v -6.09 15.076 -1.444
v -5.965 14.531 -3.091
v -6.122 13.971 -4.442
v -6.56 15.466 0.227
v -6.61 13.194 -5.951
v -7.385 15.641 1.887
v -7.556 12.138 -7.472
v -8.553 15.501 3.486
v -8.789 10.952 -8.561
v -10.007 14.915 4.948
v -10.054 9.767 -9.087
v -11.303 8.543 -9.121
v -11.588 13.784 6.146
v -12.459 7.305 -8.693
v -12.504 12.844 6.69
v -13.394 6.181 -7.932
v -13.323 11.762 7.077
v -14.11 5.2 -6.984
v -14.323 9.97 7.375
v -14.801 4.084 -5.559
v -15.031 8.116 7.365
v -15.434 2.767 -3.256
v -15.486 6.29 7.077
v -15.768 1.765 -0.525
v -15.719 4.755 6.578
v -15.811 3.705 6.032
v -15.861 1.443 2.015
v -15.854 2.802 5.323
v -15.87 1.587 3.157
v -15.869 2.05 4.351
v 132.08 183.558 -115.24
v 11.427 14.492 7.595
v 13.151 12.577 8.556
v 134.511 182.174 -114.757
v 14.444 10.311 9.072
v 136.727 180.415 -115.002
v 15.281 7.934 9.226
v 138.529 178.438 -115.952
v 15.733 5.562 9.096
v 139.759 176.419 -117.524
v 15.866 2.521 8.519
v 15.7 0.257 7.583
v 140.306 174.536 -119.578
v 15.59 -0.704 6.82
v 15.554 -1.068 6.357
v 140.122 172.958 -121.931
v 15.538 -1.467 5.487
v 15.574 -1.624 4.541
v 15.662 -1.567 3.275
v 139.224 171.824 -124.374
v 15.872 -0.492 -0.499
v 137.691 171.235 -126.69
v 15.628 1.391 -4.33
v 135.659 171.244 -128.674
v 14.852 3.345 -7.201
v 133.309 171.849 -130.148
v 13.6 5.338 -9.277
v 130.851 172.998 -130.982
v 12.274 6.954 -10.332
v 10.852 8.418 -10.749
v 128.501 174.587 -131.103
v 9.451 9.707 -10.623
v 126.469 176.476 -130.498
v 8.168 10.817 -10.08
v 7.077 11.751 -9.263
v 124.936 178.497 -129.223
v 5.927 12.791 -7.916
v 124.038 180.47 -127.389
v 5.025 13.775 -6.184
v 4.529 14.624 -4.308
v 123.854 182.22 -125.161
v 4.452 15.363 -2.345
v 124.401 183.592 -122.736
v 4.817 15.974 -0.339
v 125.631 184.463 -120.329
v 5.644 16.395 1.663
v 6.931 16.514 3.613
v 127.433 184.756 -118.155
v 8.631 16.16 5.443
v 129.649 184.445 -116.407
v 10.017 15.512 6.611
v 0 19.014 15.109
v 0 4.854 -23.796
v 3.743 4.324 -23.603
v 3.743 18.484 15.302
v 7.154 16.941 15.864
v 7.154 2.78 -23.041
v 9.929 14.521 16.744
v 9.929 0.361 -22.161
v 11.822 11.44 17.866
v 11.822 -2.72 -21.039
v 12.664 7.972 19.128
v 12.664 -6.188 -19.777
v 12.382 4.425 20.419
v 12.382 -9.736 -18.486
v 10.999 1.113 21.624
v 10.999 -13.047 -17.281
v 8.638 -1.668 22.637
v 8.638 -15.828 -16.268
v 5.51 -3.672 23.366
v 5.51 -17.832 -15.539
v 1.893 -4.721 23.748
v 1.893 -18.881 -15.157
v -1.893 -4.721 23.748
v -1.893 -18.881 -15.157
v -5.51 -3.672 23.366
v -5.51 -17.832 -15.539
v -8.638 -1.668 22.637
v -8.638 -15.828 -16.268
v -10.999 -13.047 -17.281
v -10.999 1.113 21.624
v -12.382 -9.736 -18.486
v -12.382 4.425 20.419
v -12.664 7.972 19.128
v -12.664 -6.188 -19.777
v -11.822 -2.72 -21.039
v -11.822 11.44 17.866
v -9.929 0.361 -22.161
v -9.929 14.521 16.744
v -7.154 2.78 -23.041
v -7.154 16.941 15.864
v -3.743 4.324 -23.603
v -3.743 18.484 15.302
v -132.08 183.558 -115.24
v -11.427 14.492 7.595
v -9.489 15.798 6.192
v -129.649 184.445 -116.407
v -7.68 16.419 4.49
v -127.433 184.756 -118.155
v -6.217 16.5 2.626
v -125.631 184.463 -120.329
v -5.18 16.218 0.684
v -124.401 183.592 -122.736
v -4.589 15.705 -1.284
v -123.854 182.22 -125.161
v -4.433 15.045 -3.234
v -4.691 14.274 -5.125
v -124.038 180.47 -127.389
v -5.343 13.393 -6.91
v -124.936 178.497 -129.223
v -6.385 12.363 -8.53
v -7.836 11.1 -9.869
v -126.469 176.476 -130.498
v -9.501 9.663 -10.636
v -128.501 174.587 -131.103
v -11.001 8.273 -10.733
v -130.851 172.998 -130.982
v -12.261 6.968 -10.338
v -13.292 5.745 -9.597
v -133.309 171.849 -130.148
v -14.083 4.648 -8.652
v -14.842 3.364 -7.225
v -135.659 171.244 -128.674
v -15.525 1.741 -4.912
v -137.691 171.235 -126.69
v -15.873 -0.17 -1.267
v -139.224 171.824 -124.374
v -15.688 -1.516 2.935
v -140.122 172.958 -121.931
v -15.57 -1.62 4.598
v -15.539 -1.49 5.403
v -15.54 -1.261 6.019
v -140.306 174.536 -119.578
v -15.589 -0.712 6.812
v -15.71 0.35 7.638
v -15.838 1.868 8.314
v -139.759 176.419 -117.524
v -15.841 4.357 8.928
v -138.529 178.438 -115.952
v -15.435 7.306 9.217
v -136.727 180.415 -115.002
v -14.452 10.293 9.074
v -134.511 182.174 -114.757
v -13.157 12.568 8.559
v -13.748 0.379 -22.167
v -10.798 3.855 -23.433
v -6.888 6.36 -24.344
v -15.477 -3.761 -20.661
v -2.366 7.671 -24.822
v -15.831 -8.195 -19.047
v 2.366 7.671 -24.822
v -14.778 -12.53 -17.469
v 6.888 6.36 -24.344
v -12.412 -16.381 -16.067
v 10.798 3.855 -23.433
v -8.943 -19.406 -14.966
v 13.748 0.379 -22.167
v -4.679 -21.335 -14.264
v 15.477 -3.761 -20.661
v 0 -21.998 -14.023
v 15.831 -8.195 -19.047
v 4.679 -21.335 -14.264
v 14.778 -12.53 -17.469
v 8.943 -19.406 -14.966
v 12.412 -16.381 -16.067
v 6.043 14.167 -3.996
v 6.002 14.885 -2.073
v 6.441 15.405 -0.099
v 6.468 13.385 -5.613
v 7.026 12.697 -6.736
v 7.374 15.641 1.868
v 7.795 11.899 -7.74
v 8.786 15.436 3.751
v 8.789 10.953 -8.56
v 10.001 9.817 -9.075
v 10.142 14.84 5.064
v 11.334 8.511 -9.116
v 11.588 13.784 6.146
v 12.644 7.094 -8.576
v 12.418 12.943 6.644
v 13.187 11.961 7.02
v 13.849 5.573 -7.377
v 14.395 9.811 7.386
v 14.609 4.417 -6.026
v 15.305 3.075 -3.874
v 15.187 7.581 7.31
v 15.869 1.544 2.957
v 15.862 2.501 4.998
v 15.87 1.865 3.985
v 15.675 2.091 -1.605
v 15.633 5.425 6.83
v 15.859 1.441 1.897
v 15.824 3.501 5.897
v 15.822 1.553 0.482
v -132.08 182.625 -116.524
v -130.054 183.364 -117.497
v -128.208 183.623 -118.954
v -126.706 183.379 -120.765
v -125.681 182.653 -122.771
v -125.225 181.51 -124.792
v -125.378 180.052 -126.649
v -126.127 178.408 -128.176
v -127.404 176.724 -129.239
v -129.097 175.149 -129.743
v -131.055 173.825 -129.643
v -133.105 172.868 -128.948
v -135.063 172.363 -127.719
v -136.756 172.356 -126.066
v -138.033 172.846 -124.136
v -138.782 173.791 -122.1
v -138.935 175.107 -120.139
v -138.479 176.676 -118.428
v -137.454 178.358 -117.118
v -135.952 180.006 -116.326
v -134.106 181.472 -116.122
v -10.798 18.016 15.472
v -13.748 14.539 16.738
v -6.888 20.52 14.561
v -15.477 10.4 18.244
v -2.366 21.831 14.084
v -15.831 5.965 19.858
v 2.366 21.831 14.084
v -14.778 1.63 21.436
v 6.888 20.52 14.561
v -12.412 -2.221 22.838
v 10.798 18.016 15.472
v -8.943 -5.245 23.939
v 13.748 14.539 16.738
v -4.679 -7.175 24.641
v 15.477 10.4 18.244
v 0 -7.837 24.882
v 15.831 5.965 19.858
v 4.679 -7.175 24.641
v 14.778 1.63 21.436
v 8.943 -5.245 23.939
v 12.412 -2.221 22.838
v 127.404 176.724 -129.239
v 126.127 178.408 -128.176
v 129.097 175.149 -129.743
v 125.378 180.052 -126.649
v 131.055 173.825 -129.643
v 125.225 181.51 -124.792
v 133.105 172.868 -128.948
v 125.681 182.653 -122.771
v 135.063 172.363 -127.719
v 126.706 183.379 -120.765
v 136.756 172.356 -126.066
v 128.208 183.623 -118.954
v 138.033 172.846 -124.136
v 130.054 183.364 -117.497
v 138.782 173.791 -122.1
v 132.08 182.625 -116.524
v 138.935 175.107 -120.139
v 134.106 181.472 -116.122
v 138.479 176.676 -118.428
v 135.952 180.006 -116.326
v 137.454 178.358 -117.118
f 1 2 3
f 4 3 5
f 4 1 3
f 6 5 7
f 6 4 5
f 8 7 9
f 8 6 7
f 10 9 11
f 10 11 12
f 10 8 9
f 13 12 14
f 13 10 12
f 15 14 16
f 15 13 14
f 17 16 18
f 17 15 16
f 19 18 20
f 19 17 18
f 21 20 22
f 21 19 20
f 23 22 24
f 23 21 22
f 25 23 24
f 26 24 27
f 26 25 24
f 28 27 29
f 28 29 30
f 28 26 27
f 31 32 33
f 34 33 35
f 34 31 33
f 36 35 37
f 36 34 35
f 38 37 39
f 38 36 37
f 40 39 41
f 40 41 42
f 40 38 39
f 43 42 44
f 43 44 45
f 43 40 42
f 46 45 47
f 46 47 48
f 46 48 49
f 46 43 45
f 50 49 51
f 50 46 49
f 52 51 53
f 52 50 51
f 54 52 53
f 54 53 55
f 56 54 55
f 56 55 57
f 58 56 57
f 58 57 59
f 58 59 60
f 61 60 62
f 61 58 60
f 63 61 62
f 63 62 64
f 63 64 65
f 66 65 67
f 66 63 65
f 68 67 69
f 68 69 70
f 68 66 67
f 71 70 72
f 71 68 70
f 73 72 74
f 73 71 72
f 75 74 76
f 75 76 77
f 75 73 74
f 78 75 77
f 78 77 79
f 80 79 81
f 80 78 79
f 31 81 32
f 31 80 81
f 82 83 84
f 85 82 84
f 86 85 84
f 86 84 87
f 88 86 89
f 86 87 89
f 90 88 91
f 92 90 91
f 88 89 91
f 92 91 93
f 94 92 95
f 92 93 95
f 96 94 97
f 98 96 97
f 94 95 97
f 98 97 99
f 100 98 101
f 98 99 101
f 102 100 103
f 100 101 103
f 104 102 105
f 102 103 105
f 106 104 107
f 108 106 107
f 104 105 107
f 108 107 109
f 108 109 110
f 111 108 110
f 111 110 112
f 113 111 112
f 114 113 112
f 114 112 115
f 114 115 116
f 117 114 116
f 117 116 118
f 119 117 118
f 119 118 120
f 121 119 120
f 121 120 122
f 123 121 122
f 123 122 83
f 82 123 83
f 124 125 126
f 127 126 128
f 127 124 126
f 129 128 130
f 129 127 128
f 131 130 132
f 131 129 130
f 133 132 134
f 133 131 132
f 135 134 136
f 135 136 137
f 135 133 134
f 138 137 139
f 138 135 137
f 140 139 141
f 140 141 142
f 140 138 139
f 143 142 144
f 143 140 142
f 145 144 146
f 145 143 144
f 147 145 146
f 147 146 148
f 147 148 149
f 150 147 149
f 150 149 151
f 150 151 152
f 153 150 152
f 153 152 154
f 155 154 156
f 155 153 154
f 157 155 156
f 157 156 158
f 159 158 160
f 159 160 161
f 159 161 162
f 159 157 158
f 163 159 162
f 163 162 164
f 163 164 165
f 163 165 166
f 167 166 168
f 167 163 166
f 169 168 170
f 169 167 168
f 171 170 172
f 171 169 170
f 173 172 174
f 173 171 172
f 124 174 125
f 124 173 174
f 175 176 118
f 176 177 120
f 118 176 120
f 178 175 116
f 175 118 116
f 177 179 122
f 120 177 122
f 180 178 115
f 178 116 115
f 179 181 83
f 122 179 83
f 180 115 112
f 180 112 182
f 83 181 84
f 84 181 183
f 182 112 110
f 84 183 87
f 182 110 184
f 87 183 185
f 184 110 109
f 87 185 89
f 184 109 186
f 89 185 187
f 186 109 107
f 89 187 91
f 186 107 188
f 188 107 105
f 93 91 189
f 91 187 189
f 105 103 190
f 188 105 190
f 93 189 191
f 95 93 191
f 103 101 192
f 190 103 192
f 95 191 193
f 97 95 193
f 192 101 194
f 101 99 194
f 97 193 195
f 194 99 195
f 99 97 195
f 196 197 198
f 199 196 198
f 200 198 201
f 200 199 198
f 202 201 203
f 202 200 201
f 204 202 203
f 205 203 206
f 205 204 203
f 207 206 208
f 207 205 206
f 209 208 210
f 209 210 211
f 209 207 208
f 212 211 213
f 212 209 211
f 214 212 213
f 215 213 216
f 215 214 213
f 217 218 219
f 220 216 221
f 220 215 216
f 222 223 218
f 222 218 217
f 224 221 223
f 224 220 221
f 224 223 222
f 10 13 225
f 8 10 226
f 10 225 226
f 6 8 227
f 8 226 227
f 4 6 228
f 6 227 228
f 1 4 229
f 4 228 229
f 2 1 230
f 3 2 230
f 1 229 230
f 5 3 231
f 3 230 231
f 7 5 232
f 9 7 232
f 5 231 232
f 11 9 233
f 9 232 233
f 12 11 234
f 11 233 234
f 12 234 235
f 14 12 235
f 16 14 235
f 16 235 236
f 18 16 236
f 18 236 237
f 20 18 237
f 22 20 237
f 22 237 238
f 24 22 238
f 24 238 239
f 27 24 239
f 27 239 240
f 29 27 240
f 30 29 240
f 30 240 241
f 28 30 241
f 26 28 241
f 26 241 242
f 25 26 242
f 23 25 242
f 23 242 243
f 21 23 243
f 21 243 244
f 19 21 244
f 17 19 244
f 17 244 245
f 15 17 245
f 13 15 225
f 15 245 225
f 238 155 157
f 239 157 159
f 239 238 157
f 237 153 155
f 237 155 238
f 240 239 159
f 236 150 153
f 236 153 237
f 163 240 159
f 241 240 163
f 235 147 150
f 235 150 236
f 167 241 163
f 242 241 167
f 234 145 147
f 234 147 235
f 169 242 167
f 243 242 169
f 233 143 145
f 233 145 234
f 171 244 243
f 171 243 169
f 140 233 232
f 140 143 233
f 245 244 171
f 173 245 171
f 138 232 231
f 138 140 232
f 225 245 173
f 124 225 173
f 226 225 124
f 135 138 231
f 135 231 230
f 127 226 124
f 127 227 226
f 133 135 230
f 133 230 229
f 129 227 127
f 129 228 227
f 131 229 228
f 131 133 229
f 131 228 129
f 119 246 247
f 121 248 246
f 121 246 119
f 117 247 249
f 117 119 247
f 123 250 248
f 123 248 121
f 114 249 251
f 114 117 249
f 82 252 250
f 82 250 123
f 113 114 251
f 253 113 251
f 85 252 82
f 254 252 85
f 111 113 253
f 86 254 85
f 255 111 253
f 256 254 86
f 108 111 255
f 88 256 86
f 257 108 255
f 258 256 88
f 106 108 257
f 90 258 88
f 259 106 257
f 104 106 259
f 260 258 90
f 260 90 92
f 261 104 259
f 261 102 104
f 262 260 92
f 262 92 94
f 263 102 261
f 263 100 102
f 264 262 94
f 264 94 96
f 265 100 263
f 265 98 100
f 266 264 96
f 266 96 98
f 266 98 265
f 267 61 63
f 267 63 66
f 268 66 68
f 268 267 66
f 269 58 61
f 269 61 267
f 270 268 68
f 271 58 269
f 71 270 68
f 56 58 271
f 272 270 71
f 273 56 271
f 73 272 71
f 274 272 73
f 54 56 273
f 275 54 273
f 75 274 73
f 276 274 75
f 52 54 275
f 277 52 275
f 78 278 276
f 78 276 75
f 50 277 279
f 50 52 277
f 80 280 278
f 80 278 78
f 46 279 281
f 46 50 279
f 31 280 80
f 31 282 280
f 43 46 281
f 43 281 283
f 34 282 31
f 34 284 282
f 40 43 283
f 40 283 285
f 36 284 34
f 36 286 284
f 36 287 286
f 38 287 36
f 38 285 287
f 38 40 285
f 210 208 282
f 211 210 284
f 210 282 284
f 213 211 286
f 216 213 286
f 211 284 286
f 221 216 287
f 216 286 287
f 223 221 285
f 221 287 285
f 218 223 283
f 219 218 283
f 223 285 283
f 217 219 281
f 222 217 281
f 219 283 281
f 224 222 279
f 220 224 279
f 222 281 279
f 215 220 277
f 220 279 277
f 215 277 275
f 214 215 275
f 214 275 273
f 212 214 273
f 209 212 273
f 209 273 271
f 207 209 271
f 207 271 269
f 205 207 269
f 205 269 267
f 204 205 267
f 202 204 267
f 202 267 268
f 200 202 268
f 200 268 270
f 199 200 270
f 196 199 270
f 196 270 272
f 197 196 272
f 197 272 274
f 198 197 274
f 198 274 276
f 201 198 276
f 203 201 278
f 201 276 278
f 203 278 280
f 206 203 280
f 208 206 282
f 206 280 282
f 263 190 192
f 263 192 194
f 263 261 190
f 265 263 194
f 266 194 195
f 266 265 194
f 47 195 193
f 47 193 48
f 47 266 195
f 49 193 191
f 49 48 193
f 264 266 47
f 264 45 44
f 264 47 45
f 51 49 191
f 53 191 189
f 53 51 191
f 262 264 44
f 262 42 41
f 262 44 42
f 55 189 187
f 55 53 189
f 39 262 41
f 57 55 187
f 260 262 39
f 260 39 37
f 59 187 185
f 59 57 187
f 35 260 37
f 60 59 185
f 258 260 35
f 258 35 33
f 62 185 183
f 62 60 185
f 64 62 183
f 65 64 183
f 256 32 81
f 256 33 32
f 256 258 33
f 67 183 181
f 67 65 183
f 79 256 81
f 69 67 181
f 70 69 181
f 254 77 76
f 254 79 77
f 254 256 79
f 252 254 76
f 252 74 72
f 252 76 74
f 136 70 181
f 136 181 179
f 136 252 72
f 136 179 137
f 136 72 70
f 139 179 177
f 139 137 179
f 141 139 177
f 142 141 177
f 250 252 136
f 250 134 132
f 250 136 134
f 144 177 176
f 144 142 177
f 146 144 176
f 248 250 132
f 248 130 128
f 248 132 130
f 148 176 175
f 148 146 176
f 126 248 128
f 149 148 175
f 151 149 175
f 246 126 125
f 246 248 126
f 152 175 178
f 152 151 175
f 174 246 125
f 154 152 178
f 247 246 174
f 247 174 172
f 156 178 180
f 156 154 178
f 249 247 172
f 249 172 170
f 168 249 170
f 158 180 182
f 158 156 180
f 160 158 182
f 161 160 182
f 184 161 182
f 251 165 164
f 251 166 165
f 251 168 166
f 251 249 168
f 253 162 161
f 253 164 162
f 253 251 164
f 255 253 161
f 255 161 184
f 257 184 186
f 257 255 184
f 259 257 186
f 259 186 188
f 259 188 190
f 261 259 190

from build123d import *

# Parameters (mm, degrees)
SKETCH1_R               = 15.875
BOSS_EXTRUDE1_DEPTH     = 20.701
SWEEP1_PROFILE_R        = 9.525
SWEEP2_PROFILE_R        = 9.525
CUT_EXTRUDE2_REACH      = 369.057
SKETCH36_R              = 7.9375
CUT_EXTRUDE3_REACH      = 369.057
CUT_EXTRUDE3_END_RADIUS = 15.875
SKETCH37_R              = 7.9375
SKETCH77_R              = 15.875
BOSS_EXTRUDE2_DEPTH     = 41.402
CUT_EXTRUDE1_REACH      = 264.618
SKETCH2_R               = 12.7


with BuildPart() as part:
    # Sketch1 → Boss-Extrude1 (new, symmetric)
    with BuildSketch(Plane(origin=(0, 0, 0), x_dir=(1, 0, 0), z_dir=(0, 0.34202014332566943, 0.9396926207859081))):
        with Locations(Location((0, 0, 0), (0, 0, 270))):
            Circle(SKETCH1_R)
    extrude(amount=BOSS_EXTRUDE1_DEPTH, both=True)

    # Sweep1: sweep along a path in Sketch4
    with BuildLine(Plane(origin=(0, 3.019604439, 4.156128957), x_dir=(1, 0, 0), z_dir=(0, 0.5877852522924744, 0.8090169943749467))) as sweep1_path:
        Line((-5.08, -3.732436352), (-132.08, 216.238016209))
    # Sweep1 profile (on start of the path) → Sweep1 (sweep)
    with BuildSketch(Plane(origin=(-5.08, 0, 6.35), x_dir=(0, 0.5877852522924744, 0.8090169943749466), z_dir=(-0.5000000000000013, 0.7006292692220355, -0.5090369604551278))):
        Circle(SWEEP1_PROFILE_R)
    sweep(path=sweep1_path.line)

    # Sweep2: sweep along a path in Sketch15
    with BuildLine(Plane(origin=(0, 3.019604439, 4.156128957), x_dir=(1, 0, 0), z_dir=(0, 0.5877852522924744, 0.8090169943749467))) as sweep2_path:
        Line((5.08, -3.732436352), (132.08, 216.238016209))
    # Sweep2 profile (on start of the path) → Sweep2 (sweep)
    with BuildSketch(Plane(origin=(5.08, 0, 6.35), x_dir=(0, 0.5877852522924744, 0.8090169943749466), z_dir=(0.500000000000001, 0.7006292692220356, -0.5090369604551279))):
        Circle(SWEEP2_PROFILE_R)
    sweep(path=sweep2_path.line)

    # Sketch36 → Cut-Extrude2 (cut, up to next)
    with BuildSketch(Plane(origin=(-126.653807651, 177.474729397, -128.942938553), x_dir=(0.8655546227004349, 0.3849101606410903, -0.32040499895781577), z_dir=(-0.500000000000001, 0.7006292692220356, -0.5090369604551278)), mode=Mode.PRIVATE) as cut_extrude2_sk1:
        with Locations(Location((-6.431589227, -4.927896453, 0), (0, 0, 268.110697529))):
            Circle(SKETCH36_R)
    cut_extrude2_tool1 = extrude(cut_extrude2_sk1.sketch, amount=-CUT_EXTRUDE2_REACH, mode=Mode.PRIVATE) & part.part
    add(cut_extrude2_tool1.solids().sort_by_distance((-132.08, 177.959834, -122.945388))[0], mode=Mode.SUBTRACT)

    # Cut-Extrude3: up to this cylinder (the profile starts outside it)
    cut_extrude3_end = Plane(origin=(0, -18.696540004, -51.368321484), z_dir=(0, -0.34202014332566943, -0.9396926207859081)) * Cylinder(CUT_EXTRUDE3_END_RADIUS, 770.864, mode=Mode.PRIVATE)
    # Sketch37 → Cut-Extrude3 (cut, up to the surface)
    with BuildSketch(Plane(origin=(126.653807651, 177.474729397, -128.942938553), x_dir=(0.865554622700435, -0.3849101606410899, 0.3204049989578159), z_dir=(0.5000000000000008, 0.7006292692220356, -0.5090369604551279)), mode=Mode.PRIVATE) as cut_extrude3_sk1:
        with Locations(Location((6.431589227, -4.927896453, 0), (0, 0, 271.889302471))):
            Circle(SKETCH37_R)
    cut_extrude3_tool1 = extrude(cut_extrude3_sk1.sketch, amount=-CUT_EXTRUDE3_REACH, mode=Mode.PRIVATE) - cut_extrude3_end
    add(cut_extrude3_tool1.solids().sort_by_distance((132.08, 177.959834, -122.945388))[0], mode=Mode.SUBTRACT)

    # Sketch77 → Boss-Extrude2 (add)
    with BuildSketch(Plane(origin=(0, 7.080158987, 19.452576943), x_dir=(1, 0, 0), z_dir=(0, 0.34202014332566943, 0.9396926207859082))):
        with Locations(Location((0, 0, 0), (0, 0, 270))):
            Circle(SKETCH77_R)
    extrude(amount=-BOSS_EXTRUDE2_DEPTH)

    # Sketch2 → Cut-Extrude1 (cut, up to next)
    with BuildSketch(Plane(origin=(0, -7.080158987, -19.452576943), x_dir=(-1, 0, 0), z_dir=(0, -0.34202014332566943, -0.9396926207859081)), mode=Mode.PRIVATE) as cut_extrude1_sk1:
        with Locations(Location((0, 0, 0), (0, 0, 90))):
            Circle(SKETCH2_R)
    cut_extrude1_tool1 = extrude(cut_extrude1_sk1.sketch, amount=-CUT_EXTRUDE1_REACH, mode=Mode.PRIVATE) & part.part
    add(cut_extrude1_tool1.solids().sort_by_distance((0, -7.080159, -19.452577))[0], mode=Mode.SUBTRACT)


solid = part.part
